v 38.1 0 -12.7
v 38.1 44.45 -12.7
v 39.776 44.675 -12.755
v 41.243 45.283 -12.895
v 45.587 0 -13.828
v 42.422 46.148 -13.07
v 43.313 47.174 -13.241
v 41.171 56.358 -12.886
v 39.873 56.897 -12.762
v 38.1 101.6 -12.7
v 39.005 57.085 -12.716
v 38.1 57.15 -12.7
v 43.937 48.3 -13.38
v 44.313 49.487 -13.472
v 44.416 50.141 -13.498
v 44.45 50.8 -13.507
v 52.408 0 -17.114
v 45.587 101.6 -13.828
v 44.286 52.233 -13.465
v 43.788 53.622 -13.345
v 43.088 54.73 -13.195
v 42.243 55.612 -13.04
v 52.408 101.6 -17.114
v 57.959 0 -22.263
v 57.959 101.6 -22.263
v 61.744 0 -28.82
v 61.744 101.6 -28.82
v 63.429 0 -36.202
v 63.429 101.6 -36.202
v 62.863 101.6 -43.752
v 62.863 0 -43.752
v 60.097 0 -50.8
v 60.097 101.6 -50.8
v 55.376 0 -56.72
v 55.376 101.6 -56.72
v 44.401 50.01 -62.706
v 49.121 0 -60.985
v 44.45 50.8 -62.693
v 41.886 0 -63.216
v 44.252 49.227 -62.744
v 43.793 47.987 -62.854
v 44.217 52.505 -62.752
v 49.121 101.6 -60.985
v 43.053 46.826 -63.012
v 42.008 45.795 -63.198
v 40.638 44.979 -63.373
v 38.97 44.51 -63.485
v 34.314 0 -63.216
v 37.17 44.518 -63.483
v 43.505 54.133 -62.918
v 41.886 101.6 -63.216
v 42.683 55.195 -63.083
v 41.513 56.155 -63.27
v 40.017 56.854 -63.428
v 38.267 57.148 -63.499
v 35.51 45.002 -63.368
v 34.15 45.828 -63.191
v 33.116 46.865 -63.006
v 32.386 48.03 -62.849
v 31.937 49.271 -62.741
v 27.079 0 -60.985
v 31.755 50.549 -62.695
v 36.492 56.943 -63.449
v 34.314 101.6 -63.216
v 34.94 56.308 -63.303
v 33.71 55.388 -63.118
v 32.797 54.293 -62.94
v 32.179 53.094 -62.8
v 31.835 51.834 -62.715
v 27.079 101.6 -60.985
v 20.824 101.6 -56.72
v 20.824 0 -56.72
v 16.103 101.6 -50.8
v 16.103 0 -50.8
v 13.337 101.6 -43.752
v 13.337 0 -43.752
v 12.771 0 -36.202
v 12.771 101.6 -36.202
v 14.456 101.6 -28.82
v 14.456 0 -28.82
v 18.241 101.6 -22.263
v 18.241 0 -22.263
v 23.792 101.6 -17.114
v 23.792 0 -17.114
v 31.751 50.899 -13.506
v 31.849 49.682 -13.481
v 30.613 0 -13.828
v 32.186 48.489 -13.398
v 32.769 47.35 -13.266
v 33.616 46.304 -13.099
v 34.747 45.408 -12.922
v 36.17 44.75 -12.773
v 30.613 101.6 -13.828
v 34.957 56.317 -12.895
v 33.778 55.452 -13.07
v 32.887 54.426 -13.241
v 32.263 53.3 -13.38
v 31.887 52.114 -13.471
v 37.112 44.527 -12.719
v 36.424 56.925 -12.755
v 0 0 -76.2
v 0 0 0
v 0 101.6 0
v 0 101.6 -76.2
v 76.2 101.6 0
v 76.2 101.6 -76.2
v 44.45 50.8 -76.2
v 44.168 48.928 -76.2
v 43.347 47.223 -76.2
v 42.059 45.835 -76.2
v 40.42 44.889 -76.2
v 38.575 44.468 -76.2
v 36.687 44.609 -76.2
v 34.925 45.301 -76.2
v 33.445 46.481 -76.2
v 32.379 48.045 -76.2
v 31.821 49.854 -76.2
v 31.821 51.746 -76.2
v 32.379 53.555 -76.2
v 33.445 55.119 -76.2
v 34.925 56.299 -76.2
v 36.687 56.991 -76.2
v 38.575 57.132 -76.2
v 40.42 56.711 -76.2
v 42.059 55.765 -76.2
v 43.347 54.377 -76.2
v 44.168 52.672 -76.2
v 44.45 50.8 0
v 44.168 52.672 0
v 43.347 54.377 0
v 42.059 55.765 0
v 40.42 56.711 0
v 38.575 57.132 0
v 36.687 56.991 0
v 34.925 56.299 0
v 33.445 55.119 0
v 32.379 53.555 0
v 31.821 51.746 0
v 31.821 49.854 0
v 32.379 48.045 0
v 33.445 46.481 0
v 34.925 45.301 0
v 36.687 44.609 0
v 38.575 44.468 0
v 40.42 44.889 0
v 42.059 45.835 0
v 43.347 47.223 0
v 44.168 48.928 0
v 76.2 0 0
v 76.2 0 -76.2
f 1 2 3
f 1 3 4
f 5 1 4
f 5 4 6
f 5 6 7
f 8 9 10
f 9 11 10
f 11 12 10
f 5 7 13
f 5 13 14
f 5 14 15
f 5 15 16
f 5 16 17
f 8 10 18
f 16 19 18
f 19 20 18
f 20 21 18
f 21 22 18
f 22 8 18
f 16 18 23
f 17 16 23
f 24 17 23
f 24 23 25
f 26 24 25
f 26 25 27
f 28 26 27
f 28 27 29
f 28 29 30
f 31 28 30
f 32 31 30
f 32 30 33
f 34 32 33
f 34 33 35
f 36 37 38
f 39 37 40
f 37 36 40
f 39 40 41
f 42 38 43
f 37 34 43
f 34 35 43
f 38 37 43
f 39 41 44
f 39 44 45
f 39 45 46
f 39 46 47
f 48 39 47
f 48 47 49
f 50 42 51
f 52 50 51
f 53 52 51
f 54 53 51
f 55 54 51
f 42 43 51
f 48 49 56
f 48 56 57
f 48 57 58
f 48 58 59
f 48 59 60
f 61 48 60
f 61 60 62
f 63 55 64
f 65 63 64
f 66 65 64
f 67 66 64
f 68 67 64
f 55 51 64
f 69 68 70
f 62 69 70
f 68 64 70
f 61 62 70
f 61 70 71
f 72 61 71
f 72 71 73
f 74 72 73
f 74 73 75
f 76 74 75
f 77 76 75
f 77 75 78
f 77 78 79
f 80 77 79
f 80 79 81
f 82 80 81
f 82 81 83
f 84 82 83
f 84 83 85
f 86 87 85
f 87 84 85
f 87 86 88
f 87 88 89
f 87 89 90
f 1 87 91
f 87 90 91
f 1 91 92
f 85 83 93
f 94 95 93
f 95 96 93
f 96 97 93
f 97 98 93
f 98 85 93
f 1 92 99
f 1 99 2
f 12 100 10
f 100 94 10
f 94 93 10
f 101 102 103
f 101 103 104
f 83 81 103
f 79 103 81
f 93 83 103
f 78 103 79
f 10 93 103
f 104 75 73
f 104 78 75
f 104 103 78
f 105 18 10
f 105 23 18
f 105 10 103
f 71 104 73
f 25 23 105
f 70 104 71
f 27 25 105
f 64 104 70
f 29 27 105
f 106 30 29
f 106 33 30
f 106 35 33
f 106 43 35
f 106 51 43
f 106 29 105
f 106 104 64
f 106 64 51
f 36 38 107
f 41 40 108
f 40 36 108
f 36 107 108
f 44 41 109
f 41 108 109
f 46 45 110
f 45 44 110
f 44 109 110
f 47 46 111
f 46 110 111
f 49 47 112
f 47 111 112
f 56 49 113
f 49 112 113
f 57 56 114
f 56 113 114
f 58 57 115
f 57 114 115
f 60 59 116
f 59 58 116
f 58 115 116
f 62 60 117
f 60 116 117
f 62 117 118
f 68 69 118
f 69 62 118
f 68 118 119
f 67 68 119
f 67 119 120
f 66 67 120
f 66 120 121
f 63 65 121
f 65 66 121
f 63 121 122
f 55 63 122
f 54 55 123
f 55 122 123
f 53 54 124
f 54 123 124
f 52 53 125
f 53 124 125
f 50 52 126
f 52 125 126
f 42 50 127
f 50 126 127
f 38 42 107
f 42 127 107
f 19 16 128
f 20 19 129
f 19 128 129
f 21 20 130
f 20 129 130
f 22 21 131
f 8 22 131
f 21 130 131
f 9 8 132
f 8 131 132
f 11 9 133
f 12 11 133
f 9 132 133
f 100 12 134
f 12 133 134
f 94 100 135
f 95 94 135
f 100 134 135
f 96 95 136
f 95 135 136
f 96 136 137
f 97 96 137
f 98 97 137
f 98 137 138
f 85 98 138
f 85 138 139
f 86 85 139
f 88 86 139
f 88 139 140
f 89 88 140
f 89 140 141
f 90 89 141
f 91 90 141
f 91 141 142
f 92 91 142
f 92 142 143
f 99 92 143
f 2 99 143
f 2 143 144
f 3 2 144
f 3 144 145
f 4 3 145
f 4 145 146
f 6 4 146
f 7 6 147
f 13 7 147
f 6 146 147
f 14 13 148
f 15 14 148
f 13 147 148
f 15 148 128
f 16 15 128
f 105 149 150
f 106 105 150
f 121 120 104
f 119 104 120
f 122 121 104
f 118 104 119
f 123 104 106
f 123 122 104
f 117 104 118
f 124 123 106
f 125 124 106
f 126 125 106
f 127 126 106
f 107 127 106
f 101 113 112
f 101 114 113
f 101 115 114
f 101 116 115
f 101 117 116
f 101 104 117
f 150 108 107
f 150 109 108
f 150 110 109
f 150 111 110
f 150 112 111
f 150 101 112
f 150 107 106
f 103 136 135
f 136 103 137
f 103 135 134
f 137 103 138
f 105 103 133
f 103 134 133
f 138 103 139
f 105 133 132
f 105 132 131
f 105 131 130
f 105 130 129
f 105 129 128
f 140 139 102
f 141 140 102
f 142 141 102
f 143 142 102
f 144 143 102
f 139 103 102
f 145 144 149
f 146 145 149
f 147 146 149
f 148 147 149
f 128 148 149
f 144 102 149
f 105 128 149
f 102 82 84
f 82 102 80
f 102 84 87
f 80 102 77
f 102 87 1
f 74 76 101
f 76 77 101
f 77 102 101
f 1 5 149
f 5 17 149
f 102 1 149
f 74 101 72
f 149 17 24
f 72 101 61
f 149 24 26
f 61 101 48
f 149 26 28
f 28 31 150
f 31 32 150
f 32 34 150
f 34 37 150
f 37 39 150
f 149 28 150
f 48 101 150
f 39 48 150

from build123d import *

# Parameters (mm, degrees)
SKETCH3_W           = 76.2
SKETCH3_H           = 76.2
BOSS_EXTRUDE2_DEPTH = 101.6
SKETCH4_R           = 6.35
CUT_EXTRUDE2_DEPTH  = 73.914
SKETCH5_R           = 25.4
CUT_EXTRUDE3_DEPTH  = 113.538
SKETCH7_R           = 6.35
CUT_EXTRUDE4_DEPTH  = 18.034


with BuildPart() as part:
    # Sketch3 → Boss-Extrude2 (new body)
    with BuildSketch(Plane(origin=(0, 0, 0), x_dir=(1, 0, 0), z_dir=(0, 1, 0))):
        with Locations((38.1, 38.1)):
            Rectangle(SKETCH3_W, SKETCH3_H)
    extrude(amount=BOSS_EXTRUDE2_DEPTH)

    # Sketch4 → Cut-Extrude2 (cut)
    with BuildSketch(Plane.XY):
        with Locations((38.1, 50.8)):
            Circle(SKETCH4_R)
    extrude(amount=-CUT_EXTRUDE2_DEPTH, mode=Mode.SUBTRACT)

    # Sketch5 → Cut-Extrude3 (cut)
    with BuildSketch(Plane(origin=(0, 101.6, 0), x_dir=(1, 0, 0), z_dir=(0, 1, 0))):
        with Locations(Location((38.1, 38.1, 0), (0, 0, 270))):
            Circle(SKETCH5_R)
    extrude(amount=-CUT_EXTRUDE3_DEPTH, mode=Mode.SUBTRACT)

    # Sketch7 → Cut-Extrude4 (cut)
    with BuildSketch(Plane(origin=(0, 0, -76.2), x_dir=(-1, 0, 0), z_dir=(0, 0, -1))):
        with Locations(Location((-38.1, 50.8, 0), (0, 0, 180))):
            Circle(SKETCH7_R)
    extrude(amount=-CUT_EXTRUDE4_DEPTH, mode=Mode.SUBTRACT)


solid = part.part
